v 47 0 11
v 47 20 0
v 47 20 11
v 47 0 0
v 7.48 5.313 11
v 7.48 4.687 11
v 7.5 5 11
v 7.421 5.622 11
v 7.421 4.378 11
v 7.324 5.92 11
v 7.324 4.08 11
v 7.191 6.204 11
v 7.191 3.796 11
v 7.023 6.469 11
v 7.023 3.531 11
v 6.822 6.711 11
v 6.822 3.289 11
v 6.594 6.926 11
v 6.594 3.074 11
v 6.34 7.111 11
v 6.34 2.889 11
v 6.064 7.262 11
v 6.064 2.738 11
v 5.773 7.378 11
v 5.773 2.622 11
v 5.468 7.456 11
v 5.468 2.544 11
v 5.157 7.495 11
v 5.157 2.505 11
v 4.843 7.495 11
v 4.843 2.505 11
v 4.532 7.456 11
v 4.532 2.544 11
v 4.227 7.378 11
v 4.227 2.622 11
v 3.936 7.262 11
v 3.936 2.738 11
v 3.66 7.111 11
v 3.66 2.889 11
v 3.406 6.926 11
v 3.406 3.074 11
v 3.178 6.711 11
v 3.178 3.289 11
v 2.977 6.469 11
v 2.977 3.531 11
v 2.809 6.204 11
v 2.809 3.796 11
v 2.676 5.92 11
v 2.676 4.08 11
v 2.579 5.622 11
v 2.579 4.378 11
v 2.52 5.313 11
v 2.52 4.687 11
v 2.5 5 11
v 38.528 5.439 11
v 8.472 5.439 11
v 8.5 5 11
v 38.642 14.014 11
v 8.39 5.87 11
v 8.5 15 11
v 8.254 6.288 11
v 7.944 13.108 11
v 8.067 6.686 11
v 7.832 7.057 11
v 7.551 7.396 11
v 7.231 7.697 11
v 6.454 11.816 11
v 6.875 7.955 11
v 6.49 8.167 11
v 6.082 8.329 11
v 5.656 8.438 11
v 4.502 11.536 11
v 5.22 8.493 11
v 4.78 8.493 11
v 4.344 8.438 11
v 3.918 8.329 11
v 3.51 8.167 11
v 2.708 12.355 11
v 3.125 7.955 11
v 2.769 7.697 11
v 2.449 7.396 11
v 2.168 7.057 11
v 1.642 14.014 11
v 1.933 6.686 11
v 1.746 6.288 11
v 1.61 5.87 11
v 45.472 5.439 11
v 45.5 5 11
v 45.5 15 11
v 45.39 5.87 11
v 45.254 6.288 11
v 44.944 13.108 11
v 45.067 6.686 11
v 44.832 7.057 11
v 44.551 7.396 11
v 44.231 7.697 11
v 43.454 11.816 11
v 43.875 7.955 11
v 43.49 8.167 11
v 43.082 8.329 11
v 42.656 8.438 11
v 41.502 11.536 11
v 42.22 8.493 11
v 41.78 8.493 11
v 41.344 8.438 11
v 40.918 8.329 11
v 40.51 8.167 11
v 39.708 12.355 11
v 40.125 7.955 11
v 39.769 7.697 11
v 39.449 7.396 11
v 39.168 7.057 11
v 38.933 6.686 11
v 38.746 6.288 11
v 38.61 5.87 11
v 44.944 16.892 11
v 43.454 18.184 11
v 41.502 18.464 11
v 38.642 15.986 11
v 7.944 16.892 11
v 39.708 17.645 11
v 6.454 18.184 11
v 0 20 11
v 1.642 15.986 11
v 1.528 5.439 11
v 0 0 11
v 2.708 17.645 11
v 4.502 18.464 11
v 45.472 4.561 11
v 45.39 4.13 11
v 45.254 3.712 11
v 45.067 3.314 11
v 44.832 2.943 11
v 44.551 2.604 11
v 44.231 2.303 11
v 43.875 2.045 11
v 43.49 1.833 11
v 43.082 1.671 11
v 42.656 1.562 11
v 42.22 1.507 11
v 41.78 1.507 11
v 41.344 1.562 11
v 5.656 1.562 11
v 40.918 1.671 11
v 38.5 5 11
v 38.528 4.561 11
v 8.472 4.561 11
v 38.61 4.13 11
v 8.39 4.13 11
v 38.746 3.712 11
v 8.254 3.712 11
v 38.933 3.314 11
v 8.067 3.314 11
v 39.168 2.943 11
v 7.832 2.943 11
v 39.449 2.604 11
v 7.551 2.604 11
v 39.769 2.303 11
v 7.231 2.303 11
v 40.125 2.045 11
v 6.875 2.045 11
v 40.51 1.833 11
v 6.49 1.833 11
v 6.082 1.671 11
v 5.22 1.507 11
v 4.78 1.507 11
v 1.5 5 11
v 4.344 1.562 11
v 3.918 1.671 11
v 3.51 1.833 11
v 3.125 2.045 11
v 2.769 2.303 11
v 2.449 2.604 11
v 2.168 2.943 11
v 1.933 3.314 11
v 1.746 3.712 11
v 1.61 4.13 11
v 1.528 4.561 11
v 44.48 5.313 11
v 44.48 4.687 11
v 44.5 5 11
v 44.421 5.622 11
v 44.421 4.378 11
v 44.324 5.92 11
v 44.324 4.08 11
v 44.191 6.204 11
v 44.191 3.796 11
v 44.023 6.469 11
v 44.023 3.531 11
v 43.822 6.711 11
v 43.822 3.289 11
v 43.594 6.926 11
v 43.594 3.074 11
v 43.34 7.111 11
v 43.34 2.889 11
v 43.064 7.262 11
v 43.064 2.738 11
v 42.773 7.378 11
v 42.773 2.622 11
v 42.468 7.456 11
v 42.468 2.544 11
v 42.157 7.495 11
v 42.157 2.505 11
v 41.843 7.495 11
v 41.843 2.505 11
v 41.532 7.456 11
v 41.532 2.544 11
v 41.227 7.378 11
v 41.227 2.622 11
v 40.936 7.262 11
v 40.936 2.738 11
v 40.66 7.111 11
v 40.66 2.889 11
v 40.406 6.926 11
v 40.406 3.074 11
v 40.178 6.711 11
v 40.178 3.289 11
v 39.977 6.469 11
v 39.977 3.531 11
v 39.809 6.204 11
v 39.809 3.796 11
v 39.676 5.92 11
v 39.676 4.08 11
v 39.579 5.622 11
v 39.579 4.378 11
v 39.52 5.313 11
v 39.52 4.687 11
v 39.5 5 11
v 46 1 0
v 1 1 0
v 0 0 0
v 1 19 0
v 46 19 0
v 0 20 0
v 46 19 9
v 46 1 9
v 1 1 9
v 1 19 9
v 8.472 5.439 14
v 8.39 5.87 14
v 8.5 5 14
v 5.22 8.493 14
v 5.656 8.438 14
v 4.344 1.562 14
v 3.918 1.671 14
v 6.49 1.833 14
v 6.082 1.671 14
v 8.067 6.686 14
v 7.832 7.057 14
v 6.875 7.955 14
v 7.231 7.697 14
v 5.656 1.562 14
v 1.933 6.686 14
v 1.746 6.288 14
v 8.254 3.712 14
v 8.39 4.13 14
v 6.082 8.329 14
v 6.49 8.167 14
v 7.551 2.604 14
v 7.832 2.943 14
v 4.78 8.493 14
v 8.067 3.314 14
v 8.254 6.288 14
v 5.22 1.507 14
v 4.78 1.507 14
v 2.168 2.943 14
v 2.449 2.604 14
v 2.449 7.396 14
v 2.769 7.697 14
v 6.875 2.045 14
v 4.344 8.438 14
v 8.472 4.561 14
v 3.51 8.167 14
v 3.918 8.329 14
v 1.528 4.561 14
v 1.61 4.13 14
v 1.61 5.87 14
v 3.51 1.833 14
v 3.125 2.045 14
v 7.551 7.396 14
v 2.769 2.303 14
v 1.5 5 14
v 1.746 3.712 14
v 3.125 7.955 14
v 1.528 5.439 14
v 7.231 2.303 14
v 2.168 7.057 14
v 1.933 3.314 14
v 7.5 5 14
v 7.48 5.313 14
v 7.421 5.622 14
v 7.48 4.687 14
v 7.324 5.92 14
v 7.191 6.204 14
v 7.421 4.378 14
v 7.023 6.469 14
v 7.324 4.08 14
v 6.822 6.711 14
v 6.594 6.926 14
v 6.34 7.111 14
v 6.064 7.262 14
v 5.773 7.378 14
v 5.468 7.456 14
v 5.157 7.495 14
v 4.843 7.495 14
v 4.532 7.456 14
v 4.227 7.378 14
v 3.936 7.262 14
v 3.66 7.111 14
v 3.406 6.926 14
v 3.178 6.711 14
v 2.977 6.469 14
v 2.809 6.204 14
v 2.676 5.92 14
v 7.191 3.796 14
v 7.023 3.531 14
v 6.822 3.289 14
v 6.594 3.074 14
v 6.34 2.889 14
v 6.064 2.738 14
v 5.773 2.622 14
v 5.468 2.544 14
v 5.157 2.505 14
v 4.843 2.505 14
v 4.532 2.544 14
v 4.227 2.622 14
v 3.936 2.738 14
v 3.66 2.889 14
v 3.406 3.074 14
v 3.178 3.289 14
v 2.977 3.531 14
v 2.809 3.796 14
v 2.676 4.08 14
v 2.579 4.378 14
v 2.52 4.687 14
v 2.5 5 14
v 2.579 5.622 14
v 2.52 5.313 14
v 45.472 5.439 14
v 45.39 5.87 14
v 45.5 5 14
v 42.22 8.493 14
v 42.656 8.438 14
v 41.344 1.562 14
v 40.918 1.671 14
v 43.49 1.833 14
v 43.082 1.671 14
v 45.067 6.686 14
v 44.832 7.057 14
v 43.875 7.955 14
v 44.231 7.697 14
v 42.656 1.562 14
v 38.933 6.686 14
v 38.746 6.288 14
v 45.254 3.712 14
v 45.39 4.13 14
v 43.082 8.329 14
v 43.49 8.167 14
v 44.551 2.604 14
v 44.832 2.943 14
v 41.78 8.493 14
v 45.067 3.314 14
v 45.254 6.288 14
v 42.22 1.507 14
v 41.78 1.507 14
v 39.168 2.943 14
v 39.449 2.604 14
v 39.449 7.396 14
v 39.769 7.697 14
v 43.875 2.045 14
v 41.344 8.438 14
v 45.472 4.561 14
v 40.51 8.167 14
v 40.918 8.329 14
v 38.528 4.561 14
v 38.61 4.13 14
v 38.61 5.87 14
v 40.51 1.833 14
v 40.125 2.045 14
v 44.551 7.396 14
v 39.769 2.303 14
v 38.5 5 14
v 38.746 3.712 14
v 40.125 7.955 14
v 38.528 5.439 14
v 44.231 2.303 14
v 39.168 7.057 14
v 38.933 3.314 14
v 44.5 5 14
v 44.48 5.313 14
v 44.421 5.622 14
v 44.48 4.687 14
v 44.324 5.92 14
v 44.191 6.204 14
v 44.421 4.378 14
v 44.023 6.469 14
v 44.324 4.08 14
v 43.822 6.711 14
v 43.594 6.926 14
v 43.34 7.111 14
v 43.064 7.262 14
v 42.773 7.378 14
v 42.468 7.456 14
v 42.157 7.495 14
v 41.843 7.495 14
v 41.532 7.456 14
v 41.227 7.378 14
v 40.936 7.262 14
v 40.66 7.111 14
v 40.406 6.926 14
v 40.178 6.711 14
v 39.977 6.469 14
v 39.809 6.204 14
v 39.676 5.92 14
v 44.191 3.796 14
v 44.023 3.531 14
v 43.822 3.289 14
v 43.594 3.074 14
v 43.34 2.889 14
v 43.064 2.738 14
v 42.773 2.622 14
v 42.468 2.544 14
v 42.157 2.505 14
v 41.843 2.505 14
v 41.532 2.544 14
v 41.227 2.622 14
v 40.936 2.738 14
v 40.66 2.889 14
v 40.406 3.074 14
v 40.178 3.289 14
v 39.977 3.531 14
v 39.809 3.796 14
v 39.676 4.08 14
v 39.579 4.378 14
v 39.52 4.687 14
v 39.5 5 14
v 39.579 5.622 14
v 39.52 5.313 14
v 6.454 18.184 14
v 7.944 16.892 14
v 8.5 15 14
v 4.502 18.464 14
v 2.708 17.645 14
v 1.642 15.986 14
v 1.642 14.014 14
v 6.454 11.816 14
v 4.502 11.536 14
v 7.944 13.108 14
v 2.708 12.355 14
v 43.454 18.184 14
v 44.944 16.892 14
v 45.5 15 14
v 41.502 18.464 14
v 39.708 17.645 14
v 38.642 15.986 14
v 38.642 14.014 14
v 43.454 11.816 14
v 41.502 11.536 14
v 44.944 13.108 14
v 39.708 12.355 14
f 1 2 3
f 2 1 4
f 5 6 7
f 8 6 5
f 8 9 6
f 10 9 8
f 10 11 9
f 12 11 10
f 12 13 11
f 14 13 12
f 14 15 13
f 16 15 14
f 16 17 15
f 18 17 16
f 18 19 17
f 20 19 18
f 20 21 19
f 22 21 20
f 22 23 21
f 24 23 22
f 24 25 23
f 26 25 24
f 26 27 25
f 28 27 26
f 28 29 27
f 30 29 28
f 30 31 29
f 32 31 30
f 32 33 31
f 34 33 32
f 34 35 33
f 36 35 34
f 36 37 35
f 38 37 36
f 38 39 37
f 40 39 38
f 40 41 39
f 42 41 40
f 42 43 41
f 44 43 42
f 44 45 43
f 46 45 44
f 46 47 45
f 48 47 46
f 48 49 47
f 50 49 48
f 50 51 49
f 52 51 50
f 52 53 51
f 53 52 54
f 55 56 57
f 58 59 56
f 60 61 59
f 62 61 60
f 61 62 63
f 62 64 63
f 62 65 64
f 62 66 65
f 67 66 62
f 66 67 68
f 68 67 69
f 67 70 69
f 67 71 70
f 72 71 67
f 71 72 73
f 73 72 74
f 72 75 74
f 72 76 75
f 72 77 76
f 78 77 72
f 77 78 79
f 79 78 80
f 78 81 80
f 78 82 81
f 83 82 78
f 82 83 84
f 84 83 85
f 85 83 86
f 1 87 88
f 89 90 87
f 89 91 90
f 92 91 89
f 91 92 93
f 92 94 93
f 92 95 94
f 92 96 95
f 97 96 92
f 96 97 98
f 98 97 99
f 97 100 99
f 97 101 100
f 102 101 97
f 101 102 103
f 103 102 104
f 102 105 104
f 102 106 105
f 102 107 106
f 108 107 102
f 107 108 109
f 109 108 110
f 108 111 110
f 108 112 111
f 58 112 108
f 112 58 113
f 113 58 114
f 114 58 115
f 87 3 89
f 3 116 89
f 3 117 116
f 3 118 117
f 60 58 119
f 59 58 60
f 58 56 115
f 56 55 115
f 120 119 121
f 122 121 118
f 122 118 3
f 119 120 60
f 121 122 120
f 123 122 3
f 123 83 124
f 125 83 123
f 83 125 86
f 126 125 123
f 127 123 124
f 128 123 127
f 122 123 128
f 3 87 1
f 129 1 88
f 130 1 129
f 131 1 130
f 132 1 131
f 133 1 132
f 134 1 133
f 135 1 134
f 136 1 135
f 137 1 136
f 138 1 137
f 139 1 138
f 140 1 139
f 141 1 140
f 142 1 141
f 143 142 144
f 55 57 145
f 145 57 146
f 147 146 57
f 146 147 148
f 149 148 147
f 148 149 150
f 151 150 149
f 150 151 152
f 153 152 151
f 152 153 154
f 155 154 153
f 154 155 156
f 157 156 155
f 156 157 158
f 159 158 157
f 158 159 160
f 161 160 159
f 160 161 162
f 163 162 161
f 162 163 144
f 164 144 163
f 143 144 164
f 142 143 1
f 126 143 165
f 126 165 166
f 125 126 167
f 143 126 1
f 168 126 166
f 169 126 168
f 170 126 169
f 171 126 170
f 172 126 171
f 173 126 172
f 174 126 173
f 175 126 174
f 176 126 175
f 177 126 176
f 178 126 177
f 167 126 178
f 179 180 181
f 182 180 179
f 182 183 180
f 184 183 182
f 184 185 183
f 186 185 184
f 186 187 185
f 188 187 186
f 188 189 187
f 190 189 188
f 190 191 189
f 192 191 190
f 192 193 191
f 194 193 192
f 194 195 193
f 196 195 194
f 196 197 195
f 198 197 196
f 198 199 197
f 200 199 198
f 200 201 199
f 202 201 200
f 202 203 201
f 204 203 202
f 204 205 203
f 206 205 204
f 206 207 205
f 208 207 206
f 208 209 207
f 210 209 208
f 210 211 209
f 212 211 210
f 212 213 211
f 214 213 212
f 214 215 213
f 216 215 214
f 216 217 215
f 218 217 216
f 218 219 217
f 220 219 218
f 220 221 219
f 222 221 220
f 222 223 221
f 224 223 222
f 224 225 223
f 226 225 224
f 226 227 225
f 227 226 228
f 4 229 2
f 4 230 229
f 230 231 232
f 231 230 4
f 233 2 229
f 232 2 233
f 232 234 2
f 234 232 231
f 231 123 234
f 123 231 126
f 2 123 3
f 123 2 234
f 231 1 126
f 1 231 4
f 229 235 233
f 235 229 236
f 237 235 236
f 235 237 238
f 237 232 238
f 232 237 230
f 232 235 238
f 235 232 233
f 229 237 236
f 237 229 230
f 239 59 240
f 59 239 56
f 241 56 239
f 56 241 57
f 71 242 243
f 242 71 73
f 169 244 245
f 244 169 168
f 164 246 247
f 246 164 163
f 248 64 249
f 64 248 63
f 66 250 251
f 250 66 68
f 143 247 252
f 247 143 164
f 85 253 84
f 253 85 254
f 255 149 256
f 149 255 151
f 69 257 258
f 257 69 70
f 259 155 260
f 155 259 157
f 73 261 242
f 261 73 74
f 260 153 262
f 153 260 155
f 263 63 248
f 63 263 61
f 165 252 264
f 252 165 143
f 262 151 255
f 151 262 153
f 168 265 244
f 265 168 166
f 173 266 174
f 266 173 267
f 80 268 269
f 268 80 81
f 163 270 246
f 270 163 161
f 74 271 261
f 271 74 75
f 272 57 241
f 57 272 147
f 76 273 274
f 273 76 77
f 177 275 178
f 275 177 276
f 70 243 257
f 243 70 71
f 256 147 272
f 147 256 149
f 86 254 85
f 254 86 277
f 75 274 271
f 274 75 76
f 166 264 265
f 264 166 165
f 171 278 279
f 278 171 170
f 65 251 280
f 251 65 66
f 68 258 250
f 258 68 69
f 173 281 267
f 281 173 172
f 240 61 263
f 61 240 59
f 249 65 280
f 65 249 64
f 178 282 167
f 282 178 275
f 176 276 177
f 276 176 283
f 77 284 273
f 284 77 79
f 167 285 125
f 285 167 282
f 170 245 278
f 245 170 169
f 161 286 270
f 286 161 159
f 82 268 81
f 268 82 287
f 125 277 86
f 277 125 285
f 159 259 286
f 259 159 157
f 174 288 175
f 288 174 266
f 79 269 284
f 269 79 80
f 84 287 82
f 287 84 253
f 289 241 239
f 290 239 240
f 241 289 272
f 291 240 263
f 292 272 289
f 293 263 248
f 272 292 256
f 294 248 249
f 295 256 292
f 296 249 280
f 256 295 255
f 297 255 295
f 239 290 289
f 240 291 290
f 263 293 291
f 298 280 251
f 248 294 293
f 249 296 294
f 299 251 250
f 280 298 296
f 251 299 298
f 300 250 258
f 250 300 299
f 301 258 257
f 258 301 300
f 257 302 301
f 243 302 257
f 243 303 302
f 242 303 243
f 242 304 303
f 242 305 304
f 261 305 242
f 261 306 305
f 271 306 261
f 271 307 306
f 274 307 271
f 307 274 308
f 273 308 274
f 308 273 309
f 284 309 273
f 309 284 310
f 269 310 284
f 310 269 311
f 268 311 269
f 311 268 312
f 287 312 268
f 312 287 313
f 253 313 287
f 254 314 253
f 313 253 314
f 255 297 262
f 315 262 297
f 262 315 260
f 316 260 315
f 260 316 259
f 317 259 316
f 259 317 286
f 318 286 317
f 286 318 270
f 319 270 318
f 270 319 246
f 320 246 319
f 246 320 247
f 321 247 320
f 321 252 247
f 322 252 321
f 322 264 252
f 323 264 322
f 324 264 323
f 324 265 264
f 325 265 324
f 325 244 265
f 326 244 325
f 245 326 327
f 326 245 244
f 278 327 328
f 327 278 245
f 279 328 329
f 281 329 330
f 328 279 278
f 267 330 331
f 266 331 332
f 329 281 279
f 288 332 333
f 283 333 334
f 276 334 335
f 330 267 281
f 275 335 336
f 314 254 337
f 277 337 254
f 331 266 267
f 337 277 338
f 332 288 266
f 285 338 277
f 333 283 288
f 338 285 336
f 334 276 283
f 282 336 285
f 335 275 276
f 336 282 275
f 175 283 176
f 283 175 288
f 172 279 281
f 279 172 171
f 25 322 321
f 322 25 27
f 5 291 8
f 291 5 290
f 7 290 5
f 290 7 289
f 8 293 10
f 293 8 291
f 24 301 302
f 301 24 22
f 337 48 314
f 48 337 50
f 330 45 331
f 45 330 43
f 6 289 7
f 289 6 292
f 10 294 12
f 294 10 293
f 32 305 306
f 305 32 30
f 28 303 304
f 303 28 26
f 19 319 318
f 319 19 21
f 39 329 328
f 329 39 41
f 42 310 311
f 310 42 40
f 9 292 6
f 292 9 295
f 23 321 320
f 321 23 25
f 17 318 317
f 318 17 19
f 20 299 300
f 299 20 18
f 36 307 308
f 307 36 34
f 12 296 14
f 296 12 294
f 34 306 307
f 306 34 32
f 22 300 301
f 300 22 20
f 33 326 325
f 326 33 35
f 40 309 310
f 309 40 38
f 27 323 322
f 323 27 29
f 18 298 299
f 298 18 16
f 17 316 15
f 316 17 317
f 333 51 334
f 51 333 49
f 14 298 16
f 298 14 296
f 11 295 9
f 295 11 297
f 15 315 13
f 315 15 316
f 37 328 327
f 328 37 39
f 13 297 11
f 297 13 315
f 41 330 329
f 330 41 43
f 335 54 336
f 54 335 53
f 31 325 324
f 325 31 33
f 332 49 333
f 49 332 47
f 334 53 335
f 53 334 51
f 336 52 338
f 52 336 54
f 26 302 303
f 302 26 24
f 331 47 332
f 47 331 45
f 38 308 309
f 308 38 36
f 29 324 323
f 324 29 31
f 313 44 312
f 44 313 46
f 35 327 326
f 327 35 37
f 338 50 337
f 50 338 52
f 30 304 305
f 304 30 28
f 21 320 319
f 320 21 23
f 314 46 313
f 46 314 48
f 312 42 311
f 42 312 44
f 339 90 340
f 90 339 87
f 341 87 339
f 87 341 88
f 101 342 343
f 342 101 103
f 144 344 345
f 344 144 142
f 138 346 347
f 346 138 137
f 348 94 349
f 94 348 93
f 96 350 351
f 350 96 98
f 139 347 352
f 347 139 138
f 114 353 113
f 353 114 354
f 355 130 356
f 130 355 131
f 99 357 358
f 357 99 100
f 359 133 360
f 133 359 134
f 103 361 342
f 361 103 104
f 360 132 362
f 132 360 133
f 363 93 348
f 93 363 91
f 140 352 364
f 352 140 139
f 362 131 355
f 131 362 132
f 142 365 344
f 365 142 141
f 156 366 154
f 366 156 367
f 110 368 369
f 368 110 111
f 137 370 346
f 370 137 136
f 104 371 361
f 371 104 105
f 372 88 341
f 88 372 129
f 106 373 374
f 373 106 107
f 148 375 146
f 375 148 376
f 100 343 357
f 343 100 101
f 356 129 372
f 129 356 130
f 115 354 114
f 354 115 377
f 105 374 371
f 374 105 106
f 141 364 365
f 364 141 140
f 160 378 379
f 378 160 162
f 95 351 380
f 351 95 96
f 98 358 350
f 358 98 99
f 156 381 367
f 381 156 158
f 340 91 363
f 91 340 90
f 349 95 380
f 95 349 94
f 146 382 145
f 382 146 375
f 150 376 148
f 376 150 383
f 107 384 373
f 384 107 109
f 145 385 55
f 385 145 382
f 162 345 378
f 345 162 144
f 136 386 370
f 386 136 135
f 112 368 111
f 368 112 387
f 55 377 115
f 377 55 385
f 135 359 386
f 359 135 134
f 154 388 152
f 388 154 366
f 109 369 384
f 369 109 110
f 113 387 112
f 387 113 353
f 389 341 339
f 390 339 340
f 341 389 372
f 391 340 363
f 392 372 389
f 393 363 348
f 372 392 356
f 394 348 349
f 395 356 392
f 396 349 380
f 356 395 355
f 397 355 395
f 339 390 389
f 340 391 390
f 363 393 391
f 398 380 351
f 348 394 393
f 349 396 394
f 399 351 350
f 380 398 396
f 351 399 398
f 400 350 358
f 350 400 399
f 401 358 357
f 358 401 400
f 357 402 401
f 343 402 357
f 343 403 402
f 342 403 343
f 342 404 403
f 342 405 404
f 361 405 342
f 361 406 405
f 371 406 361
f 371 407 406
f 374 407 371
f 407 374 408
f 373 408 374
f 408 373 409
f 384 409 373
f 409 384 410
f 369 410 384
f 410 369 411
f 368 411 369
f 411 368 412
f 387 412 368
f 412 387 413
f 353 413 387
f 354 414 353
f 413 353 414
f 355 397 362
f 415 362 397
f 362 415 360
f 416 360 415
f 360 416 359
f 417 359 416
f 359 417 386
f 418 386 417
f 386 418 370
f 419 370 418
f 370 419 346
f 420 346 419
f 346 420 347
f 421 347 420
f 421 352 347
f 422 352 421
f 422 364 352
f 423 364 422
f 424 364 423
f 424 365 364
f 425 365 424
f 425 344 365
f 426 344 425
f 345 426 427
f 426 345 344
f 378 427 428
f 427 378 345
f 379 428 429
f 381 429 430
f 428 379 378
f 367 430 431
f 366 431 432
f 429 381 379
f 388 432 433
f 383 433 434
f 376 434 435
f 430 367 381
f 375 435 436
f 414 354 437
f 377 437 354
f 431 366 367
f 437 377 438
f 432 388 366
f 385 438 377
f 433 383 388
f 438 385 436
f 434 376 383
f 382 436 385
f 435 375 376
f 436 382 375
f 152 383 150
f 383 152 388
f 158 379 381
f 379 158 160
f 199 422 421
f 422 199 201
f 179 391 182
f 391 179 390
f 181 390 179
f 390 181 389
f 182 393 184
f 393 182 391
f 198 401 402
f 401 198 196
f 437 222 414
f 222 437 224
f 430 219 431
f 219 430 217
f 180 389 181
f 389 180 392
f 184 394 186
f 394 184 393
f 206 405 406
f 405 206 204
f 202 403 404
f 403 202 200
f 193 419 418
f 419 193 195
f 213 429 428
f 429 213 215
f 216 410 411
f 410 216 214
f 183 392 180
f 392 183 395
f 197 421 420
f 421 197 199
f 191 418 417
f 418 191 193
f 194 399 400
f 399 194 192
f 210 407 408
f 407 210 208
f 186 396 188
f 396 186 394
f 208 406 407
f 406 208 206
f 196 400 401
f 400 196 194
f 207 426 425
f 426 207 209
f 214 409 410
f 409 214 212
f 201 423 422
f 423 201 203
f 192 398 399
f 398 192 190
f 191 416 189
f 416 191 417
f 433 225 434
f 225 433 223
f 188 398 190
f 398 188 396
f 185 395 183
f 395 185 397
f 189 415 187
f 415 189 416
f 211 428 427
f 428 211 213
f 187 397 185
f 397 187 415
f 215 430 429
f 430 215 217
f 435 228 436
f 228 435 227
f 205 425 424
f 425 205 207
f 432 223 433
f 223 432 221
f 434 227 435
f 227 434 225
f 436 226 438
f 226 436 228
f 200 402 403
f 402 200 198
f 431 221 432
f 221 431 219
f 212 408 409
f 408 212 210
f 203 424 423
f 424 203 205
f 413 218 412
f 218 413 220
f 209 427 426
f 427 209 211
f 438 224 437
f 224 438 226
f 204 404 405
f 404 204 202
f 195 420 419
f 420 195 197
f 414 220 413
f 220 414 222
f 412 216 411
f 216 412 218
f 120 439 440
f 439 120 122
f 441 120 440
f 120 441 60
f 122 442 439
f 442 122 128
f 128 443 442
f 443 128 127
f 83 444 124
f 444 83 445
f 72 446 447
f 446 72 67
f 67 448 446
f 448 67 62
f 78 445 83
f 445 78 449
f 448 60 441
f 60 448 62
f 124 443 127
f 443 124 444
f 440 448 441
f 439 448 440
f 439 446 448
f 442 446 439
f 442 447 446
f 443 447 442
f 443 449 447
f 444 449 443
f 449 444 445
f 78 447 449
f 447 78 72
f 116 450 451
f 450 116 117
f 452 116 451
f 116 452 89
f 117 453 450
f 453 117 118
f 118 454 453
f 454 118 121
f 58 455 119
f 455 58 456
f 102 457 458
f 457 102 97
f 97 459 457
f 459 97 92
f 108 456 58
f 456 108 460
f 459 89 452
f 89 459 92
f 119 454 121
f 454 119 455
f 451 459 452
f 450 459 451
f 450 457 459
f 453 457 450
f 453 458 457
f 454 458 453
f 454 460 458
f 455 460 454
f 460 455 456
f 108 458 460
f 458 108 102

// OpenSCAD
difference() {cube([47,20,11]);translate([1,1,0]) cube([45,18,9]);}
translate([5,5,11]) difference() {cylinder($fn=50,3,3.5,3.5, false);cylinder($fn=50,3,2.5,2.5, false);}
translate([5,15,11]) cylinder(3,3.5,3.5, false);
translate([42,15,11]) cylinder(3,3.5,3.5, false);
translate([42,5,11]) difference() {cylinder($fn=50,3,3.5,3.5, false);cylinder($fn=50,3,2.5,2.5, false);}
